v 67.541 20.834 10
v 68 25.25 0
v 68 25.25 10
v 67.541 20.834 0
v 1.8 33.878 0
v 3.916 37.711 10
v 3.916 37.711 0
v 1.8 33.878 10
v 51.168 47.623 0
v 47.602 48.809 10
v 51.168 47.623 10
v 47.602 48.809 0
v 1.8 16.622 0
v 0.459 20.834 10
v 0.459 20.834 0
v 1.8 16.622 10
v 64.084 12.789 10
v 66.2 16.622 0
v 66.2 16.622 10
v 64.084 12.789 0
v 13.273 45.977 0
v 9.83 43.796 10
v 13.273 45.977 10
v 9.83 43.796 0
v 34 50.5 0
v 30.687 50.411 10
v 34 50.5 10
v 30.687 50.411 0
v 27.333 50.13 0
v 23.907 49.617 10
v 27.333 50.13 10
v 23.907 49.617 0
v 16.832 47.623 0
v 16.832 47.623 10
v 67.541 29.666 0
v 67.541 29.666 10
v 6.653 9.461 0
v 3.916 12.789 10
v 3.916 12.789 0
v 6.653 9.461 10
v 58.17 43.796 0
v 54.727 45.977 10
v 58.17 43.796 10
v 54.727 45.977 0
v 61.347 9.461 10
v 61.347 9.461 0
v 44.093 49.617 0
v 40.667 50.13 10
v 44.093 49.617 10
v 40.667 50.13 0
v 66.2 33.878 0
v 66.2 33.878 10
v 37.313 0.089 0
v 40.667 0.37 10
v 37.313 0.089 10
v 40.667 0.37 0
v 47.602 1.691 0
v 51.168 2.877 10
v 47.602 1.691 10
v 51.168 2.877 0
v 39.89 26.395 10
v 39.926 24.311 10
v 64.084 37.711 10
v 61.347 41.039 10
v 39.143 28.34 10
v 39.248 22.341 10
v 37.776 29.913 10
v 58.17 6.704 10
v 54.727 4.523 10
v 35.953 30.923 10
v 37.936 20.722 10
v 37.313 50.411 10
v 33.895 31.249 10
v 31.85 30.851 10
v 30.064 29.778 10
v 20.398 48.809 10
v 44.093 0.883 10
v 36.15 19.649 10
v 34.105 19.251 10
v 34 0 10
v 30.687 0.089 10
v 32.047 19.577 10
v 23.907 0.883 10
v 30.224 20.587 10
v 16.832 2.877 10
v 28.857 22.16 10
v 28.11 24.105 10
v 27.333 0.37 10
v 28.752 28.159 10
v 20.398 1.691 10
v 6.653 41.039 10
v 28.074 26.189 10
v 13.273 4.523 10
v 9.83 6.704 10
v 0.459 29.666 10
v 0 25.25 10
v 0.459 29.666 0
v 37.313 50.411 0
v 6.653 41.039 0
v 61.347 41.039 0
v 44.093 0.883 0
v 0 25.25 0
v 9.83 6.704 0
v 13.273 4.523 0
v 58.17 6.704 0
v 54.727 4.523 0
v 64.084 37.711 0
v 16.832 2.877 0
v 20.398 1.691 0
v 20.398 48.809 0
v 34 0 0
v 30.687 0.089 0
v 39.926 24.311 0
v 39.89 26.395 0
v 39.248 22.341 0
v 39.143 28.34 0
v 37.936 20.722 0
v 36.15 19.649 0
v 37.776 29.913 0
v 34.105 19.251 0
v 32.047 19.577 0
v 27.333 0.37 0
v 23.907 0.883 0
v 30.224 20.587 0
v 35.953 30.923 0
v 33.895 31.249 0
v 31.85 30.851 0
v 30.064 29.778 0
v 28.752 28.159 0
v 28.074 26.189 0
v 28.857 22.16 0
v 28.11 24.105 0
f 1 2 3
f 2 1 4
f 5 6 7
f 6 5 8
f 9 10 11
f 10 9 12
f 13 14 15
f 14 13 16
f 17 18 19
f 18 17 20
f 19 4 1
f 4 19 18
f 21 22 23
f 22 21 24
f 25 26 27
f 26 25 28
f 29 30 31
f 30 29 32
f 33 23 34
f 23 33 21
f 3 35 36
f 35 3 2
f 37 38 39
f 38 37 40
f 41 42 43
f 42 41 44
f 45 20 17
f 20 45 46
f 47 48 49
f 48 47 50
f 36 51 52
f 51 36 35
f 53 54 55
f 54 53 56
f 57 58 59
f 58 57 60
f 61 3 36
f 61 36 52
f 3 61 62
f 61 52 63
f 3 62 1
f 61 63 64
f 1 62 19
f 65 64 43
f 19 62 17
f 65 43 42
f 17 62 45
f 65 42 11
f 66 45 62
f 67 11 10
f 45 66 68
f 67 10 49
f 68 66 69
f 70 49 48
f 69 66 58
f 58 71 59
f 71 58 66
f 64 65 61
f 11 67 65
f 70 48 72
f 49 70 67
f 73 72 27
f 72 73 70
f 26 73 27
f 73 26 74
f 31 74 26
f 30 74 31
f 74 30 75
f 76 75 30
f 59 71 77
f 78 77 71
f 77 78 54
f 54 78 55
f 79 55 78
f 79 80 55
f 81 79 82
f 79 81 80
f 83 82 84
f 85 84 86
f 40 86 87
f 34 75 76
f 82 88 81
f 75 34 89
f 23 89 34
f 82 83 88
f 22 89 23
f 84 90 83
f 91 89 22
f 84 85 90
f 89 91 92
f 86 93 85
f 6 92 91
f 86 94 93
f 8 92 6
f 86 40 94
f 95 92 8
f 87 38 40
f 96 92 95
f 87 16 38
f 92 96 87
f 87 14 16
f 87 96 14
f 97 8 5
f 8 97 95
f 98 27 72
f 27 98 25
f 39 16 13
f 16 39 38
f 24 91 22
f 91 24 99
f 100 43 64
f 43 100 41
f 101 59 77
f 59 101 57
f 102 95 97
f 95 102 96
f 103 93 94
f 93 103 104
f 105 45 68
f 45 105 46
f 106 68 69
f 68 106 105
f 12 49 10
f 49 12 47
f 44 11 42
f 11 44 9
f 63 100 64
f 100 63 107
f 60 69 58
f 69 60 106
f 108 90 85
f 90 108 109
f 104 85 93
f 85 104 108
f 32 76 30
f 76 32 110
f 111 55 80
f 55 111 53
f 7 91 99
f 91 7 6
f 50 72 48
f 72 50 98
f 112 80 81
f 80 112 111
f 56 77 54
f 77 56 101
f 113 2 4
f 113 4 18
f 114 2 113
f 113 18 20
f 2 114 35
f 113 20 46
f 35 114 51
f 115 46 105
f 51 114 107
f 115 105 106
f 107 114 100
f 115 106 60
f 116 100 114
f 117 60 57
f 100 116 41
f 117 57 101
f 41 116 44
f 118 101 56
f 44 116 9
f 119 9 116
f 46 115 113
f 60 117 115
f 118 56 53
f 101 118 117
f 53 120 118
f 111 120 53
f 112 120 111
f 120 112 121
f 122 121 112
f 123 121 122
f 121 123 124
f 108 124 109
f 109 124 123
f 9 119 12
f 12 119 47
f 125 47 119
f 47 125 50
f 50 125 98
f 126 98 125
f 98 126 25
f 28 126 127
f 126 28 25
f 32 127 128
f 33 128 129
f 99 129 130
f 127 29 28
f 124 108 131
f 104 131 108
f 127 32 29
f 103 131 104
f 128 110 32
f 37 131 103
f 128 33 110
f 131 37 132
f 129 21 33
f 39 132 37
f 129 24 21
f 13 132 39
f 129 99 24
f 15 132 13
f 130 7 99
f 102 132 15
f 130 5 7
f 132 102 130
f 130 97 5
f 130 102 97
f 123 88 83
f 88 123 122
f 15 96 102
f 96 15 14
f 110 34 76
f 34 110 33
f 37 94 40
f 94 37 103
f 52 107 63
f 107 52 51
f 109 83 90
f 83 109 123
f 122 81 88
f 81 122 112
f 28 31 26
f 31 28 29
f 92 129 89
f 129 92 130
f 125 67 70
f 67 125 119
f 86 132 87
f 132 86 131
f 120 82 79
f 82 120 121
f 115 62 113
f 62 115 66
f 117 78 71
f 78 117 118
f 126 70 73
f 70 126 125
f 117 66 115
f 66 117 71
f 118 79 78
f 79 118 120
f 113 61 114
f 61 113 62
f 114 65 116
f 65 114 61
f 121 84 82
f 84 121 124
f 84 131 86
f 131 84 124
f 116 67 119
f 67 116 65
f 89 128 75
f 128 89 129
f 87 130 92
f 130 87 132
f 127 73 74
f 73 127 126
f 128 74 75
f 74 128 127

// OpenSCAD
$fn = 32;

// ----------------------------------------------------------------------
// Cam plate: double_lobe cam, base R24
// ----------------------------------------------------------------------

// --- parameters (mm) ---
base_r = 24;              // base circle radius
lobe_h = 10;              // cam lobe rise
bore_r = 6;               // shaft bore radius
plate_t = 10;             // plate thickness, Z (extrusion height)

profile = [[68, 25.25], [67.541, 29.666], [66.2, 33.878], [64.084, 37.711], [61.347, 41.039], [58.17, 43.796], [54.727, 45.977], [51.168, 47.623], [47.602, 48.809], [44.093, 49.617], [40.667, 50.13], [37.313, 50.411], [34, 50.5], [30.687, 50.411], [27.333, 50.13], [23.907, 49.617], [20.398, 48.809], [16.832, 47.623], [13.273, 45.977], [9.83, 43.796], [6.653, 41.039], [3.916, 37.711], [1.8, 33.878], [0.459, 29.666], [0, 25.25], [0.459, 20.834], [1.8, 16.622], [3.916, 12.789], [6.653, 9.461], [9.83, 6.704], [13.273, 4.523], [16.832, 2.877], [20.398, 1.691], [23.907, 0.883], [27.333, 0.37], [30.687, 0.089], [34, 0], [37.313, 0.089], [40.667, 0.37], [44.093, 0.883], [47.602, 1.691], [51.168, 2.877], [54.727, 4.523], [58.17, 6.704], [61.347, 9.461], [64.084, 12.789], [66.2, 16.622], [67.541, 20.834]];  // primary outline, 48 points, counter clockwise
void_1 = [[39.89, 26.395], [39.143, 28.34], [37.776, 29.913], [35.953, 30.923], [33.895, 31.249], [31.85, 30.851], [30.064, 29.778], [28.752, 28.159], [28.074, 26.189], [28.11, 24.105], [28.857, 22.16], [30.224, 20.587], [32.047, 19.577], [34.105, 19.251], [36.15, 19.649], [37.936, 20.722], [39.248, 22.341], [39.926, 24.311]];  // shaft bore, 18 points

// --- the one profile operation ---
difference() {
  linear_extrude(height = plate_t) polygon(points = profile);
  translate([0, 0, -1])
    linear_extrude(height = plate_t + 2) polygon(points = void_1);
}
